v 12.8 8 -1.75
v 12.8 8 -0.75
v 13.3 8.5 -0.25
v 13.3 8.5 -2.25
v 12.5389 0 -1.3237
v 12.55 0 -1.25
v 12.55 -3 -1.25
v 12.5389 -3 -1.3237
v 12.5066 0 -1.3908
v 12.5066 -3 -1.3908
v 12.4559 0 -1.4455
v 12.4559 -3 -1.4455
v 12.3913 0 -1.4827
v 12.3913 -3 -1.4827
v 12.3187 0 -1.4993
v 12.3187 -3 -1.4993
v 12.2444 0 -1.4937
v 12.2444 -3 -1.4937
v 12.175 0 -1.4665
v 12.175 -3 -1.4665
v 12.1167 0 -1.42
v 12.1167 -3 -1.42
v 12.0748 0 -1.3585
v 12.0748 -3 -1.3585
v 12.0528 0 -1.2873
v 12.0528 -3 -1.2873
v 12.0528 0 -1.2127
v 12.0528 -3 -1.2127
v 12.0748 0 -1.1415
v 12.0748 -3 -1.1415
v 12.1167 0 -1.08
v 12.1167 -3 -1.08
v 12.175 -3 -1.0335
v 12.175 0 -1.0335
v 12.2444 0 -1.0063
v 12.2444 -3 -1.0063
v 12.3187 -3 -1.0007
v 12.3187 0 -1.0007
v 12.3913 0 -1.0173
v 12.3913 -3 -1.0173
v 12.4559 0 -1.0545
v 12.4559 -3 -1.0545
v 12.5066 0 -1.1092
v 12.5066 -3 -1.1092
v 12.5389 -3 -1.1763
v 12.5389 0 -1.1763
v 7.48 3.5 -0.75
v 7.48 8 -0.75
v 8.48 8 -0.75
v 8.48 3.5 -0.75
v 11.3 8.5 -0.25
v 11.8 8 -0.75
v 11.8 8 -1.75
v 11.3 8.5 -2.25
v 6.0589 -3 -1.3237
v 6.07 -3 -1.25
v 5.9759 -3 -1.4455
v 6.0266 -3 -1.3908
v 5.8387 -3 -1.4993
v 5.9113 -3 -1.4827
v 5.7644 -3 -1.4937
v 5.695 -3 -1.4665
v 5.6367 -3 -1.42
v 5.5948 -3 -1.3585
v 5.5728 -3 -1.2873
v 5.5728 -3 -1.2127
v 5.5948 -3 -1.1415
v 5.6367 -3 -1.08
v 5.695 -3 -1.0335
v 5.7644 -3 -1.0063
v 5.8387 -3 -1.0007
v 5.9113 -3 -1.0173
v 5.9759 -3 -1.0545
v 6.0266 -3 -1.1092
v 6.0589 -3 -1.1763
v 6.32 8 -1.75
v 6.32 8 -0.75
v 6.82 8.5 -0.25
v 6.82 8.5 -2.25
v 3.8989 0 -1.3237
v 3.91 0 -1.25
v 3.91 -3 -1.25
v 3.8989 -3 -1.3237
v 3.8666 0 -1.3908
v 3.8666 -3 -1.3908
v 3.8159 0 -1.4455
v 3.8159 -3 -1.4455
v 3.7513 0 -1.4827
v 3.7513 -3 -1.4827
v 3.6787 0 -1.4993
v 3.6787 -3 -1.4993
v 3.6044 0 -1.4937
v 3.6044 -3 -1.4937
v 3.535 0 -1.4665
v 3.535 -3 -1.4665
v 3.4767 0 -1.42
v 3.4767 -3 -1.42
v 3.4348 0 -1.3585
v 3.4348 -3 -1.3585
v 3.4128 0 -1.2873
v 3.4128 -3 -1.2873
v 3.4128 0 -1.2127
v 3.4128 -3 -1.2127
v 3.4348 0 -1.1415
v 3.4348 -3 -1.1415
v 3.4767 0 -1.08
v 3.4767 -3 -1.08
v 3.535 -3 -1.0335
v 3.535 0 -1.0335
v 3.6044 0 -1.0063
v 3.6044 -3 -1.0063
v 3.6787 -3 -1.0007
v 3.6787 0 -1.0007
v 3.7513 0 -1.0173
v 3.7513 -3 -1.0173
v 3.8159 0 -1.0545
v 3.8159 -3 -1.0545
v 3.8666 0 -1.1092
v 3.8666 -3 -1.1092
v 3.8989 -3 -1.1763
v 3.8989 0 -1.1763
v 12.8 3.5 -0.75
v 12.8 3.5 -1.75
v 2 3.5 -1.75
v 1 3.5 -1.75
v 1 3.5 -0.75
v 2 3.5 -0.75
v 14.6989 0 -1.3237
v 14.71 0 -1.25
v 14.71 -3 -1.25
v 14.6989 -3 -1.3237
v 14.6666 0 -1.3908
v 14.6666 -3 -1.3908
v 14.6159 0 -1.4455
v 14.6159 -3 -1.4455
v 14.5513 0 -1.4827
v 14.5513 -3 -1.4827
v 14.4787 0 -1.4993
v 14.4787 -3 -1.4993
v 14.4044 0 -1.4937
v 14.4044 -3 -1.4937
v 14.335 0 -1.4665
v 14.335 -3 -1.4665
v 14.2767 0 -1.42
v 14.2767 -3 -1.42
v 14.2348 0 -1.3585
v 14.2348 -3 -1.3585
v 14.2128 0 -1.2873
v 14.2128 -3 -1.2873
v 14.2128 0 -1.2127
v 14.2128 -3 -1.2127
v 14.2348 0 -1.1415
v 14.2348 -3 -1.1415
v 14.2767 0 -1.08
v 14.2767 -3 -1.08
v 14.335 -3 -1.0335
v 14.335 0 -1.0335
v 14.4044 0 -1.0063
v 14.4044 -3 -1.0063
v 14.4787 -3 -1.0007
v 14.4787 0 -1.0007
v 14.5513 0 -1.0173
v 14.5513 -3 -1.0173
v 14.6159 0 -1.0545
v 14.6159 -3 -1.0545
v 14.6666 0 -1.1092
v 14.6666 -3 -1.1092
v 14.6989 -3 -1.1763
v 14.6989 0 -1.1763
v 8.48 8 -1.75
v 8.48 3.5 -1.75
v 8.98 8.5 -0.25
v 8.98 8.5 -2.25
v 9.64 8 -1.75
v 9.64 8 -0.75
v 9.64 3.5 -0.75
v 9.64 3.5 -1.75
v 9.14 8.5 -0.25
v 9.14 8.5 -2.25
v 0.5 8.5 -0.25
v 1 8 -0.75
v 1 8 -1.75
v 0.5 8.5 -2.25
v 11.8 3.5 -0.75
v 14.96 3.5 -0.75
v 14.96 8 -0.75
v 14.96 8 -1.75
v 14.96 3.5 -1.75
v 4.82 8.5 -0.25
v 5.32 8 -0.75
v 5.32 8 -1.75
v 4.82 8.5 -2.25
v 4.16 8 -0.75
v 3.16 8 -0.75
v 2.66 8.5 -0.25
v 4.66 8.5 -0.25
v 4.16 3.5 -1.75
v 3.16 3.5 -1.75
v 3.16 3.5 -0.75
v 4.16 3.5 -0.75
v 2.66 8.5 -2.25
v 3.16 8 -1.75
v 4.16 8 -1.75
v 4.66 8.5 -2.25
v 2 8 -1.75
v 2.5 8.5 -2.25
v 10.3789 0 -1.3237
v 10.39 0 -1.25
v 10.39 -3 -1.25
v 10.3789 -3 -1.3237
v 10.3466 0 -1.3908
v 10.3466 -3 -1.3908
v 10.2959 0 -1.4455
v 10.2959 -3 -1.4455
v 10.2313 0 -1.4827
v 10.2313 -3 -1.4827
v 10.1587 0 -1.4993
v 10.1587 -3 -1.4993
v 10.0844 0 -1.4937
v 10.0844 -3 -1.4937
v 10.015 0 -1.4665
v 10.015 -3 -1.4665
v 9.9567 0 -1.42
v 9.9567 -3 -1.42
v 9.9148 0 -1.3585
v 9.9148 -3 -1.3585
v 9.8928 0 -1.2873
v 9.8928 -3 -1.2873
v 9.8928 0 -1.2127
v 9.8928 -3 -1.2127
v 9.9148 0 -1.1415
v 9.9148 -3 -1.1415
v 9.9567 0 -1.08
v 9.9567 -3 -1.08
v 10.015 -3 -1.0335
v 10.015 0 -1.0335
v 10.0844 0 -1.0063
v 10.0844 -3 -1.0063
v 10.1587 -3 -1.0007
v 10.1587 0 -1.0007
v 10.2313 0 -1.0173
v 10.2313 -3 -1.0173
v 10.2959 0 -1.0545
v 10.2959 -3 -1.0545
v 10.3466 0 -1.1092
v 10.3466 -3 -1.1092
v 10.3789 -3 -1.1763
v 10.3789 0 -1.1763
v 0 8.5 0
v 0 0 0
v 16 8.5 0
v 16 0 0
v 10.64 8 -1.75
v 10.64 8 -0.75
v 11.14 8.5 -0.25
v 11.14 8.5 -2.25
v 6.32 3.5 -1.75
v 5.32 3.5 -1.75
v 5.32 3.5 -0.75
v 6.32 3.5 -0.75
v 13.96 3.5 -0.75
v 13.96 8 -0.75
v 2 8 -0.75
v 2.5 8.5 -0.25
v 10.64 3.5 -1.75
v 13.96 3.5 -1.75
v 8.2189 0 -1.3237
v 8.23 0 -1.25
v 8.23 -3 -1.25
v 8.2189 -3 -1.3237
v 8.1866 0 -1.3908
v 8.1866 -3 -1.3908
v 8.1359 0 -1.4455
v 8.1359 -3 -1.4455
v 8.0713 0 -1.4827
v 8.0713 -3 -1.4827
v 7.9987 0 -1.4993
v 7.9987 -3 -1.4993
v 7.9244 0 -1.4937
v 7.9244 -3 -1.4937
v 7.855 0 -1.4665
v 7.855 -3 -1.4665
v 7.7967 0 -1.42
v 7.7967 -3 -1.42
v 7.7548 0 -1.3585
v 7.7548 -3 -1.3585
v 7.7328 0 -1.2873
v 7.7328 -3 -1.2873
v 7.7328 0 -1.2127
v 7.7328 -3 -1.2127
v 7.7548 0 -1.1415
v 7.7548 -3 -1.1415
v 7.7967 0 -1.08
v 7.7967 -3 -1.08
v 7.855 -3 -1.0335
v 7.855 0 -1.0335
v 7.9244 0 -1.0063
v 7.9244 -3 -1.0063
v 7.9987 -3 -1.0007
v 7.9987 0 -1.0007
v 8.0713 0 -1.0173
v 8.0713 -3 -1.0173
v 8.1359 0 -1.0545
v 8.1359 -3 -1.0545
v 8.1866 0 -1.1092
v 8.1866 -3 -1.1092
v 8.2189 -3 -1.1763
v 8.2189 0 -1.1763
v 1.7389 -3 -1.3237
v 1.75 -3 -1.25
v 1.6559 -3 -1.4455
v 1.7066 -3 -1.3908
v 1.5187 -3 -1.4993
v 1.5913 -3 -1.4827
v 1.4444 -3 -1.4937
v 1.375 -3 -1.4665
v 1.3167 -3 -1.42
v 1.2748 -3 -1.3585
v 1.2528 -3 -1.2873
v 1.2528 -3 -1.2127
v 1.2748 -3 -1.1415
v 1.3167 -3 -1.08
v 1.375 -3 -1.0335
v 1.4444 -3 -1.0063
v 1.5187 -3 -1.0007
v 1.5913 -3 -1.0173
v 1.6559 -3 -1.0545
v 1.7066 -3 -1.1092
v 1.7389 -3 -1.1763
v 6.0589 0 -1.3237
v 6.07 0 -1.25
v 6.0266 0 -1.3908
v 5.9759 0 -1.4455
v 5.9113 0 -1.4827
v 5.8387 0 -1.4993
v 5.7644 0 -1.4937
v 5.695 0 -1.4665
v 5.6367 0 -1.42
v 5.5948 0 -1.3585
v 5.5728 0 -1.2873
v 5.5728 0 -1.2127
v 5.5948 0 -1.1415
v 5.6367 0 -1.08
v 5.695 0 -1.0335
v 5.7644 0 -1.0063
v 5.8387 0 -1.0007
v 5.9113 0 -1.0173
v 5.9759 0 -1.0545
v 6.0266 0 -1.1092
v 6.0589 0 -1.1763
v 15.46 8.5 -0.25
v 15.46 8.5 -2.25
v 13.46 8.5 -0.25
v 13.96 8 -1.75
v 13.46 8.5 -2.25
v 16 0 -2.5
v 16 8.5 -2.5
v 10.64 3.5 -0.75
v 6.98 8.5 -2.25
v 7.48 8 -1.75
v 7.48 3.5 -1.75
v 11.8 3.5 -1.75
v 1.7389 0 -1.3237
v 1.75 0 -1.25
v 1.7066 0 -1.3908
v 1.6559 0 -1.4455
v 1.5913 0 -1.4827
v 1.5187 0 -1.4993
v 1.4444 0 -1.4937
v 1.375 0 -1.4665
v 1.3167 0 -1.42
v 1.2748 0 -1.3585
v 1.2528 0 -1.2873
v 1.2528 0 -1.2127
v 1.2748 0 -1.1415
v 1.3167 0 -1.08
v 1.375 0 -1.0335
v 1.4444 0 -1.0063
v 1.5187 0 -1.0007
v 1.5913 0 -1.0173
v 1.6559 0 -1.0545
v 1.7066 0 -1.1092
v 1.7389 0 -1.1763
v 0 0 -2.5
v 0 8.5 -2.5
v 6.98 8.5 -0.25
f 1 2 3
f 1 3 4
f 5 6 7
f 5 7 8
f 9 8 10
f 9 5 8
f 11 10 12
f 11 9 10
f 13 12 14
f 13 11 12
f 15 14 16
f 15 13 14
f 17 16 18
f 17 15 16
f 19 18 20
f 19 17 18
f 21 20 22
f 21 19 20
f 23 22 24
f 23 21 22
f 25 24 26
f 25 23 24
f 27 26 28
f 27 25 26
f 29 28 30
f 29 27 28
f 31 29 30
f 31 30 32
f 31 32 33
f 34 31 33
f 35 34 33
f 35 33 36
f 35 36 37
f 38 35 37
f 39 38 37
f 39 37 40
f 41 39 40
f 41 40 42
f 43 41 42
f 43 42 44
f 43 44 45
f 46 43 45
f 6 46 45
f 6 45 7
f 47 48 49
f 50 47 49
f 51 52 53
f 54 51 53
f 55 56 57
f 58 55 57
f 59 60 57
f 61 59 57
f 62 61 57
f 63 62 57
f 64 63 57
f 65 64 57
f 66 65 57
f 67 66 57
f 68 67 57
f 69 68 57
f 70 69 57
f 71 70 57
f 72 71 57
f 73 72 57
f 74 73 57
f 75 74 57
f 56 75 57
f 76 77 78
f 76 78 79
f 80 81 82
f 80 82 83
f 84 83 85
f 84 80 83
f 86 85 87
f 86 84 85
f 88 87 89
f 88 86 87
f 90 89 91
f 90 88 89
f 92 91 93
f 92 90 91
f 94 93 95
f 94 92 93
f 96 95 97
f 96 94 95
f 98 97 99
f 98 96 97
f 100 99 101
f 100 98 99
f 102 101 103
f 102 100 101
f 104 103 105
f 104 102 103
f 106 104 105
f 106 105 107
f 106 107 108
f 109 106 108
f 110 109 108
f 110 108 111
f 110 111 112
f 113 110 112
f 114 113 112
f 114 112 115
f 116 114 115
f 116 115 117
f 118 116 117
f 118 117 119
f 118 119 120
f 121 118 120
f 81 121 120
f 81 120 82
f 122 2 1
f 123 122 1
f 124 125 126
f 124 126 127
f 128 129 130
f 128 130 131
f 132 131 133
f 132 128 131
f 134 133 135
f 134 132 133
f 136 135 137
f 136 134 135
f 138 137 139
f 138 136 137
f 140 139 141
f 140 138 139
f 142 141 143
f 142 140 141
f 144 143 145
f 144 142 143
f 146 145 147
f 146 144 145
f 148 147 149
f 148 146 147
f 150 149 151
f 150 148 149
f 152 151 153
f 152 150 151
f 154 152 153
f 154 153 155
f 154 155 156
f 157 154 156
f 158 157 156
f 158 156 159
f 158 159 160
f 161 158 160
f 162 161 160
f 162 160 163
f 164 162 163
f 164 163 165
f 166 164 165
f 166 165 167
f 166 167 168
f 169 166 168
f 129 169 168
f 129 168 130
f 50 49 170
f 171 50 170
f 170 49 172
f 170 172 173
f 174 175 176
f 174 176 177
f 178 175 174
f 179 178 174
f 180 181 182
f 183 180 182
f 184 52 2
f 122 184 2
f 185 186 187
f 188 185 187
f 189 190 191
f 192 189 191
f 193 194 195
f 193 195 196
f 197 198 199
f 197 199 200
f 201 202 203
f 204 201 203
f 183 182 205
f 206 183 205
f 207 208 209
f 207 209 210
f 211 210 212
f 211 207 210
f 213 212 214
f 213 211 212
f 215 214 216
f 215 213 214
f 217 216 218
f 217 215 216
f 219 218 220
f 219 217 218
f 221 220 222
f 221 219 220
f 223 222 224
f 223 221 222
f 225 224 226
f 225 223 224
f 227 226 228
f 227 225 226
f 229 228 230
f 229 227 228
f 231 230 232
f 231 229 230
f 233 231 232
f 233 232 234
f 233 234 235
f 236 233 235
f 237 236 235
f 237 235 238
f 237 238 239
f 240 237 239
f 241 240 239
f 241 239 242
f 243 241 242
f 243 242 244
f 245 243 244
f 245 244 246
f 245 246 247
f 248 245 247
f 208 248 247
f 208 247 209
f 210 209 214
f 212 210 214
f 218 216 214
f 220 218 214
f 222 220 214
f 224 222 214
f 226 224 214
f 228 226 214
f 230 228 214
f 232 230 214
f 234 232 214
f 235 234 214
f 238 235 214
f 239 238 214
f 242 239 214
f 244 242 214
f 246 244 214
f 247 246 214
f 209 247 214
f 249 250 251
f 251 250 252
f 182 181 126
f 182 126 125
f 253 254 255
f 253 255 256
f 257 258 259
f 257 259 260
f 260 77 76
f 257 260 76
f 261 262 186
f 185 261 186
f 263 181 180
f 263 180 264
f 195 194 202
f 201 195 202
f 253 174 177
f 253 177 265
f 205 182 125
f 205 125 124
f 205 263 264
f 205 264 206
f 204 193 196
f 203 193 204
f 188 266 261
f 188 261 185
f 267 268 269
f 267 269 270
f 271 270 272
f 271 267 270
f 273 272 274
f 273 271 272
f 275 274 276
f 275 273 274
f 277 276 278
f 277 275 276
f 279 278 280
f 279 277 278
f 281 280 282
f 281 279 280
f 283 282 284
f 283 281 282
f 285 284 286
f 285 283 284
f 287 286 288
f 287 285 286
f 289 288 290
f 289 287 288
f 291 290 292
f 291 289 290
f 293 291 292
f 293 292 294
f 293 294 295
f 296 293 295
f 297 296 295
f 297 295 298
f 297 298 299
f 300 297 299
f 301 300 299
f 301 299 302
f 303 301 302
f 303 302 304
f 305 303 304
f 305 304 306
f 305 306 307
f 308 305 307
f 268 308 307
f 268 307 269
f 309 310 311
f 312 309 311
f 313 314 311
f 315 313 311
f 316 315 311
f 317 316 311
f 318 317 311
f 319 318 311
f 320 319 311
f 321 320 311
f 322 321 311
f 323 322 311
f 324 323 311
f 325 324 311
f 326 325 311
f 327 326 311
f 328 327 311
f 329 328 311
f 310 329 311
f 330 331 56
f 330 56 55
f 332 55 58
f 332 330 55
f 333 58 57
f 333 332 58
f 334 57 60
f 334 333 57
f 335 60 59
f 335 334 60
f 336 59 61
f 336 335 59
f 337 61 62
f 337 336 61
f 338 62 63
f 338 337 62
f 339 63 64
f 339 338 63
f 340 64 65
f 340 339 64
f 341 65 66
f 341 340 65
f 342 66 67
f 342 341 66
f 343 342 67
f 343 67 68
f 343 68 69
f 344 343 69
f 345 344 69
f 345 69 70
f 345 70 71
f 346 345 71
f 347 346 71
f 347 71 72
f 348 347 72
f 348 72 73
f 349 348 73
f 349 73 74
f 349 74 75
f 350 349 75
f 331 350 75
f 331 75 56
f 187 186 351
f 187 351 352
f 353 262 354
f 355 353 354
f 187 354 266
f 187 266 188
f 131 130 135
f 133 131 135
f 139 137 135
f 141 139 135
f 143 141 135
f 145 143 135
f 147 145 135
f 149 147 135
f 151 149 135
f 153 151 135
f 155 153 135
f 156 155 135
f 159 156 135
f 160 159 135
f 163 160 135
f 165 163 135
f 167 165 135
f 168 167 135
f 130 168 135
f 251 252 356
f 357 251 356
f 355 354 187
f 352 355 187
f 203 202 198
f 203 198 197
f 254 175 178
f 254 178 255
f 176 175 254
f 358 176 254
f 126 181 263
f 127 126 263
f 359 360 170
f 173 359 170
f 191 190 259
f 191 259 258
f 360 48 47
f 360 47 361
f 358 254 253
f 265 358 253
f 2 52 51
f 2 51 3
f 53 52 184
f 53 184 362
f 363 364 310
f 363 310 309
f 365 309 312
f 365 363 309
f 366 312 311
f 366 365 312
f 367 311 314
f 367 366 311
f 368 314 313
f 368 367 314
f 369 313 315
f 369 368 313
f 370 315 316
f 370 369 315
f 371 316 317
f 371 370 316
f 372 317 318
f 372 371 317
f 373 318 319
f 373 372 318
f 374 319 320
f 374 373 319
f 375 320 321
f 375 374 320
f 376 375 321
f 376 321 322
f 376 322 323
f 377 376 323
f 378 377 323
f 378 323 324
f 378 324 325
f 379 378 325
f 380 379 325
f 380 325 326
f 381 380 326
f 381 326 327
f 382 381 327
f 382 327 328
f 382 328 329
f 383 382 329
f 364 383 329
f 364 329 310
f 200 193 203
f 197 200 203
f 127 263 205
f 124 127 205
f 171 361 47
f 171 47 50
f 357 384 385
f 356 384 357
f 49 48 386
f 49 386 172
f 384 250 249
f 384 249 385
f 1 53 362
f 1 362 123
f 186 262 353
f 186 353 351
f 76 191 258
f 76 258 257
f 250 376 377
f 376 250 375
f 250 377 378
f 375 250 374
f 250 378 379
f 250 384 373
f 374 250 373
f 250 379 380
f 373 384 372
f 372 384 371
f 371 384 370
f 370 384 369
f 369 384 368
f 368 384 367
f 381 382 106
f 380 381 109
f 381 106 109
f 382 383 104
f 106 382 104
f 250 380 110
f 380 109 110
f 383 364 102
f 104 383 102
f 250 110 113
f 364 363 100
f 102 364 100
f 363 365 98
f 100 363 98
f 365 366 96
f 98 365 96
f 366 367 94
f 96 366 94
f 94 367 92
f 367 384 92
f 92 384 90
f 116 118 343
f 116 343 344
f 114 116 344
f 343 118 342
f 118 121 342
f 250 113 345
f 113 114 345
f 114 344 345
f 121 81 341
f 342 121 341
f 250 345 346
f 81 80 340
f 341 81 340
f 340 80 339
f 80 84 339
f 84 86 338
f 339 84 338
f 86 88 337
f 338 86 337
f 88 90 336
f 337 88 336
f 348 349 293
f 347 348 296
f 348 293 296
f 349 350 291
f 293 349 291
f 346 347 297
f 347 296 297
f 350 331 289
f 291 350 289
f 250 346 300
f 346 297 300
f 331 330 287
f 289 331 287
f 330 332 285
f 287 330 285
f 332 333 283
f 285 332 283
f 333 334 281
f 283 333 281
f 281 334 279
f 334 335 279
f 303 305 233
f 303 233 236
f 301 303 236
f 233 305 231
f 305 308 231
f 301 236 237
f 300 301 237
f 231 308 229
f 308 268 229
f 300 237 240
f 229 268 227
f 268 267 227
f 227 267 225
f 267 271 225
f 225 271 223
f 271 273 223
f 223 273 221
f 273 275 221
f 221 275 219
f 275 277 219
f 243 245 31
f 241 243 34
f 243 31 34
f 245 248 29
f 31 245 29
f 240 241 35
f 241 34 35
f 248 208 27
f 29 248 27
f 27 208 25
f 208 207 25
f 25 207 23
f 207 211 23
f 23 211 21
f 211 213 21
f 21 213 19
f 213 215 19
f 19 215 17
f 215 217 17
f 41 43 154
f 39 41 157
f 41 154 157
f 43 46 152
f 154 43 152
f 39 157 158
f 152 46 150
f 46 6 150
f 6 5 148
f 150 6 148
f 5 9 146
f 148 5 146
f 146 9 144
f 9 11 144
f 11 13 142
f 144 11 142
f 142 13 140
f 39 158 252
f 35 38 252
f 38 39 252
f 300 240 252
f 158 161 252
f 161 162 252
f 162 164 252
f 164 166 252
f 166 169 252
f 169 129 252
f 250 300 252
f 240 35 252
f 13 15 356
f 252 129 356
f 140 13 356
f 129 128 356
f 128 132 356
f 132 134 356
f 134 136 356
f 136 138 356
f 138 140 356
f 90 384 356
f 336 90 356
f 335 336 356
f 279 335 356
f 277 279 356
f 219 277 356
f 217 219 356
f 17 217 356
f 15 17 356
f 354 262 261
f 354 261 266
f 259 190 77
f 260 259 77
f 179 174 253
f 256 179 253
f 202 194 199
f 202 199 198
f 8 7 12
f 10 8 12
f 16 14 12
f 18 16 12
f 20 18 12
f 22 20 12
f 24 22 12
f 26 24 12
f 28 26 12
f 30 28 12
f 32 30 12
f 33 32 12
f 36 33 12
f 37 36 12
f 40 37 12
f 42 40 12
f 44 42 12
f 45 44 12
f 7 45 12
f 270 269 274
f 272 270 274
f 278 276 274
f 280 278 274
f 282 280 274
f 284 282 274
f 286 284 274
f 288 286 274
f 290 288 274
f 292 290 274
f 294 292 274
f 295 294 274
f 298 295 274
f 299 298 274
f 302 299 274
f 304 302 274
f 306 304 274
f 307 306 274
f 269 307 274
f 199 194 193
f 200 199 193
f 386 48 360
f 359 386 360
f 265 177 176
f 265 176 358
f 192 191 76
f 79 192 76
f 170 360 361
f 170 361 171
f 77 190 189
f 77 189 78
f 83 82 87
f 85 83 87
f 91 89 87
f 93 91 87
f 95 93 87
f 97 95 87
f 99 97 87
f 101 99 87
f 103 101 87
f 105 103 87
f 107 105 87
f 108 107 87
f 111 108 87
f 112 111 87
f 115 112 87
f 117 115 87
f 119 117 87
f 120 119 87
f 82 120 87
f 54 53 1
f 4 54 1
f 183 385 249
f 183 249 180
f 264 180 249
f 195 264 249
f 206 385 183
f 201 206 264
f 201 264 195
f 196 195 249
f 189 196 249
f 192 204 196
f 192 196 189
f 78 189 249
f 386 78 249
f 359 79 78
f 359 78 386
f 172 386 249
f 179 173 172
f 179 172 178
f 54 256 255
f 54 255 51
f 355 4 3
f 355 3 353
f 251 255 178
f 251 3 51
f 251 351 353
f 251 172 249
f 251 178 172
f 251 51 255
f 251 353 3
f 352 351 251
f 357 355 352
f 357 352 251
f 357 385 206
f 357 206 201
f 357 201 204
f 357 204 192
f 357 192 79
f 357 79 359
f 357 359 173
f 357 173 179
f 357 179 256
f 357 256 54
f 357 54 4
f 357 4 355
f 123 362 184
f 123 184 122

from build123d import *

# Parameters (mm, degrees)
SKETCH1_W           = 16
SKETCH1_H           = 2.5
BOSS_EXTRUDE1_DEPTH = 8.5
SKETCH2_W           = 1
SKETCH2_H           = 1
CUT_EXTRUDE1_DEPTH  = 5
CHAMFER1_SIZE       = 0.5
SKETCH3_R           = 0.25
BOSS_EXTRUDE2_DEPTH = 6.5


with BuildPart() as part:
    # Sketch1 → Boss-Extrude1 (new body)
    with BuildSketch(Plane(origin=(0, 0, 0), x_dir=(1, 0, 0), z_dir=(0, 1, 0))):
        with Locations((8, 1.25)):
            Rectangle(SKETCH1_W, SKETCH1_H)
    extrude(amount=BOSS_EXTRUDE1_DEPTH)

    # Sketch2 → Cut-Extrude1 (cut)
    with BuildSketch(Plane(origin=(0, 8.5, 0), x_dir=(1, 0, 0), z_dir=(0, 1, 0))):
        with Locations((1.5, 1.25)):
            Rectangle(SKETCH2_W, SKETCH2_H)
        with Locations((3.66, 1.25)):
            Rectangle(SKETCH2_W, SKETCH2_H)
        with Locations((5.82, 1.25)):
            Rectangle(SKETCH2_W, SKETCH2_H)
        with Locations((7.98, 1.25)):
            Rectangle(SKETCH2_W, SKETCH2_H)
        with Locations((10.14, 1.25)):
            Rectangle(SKETCH2_W, SKETCH2_H)
        with Locations((12.3, 1.25)):
            Rectangle(SKETCH2_W, SKETCH2_H)
        with Locations((14.46, 1.25)):
            Rectangle(SKETCH2_W, SKETCH2_H)
    extrude(amount=-CUT_EXTRUDE1_DEPTH, mode=Mode.SUBTRACT)

    # Chamfer1
    chamfer1_edges = [part.edges().sort_by_distance(p)[0] for p in [
        (1, 8.5, -1.25),
        (1.5, 8.5, -0.75),
        (2, 8.5, -1.25),
        (1.5, 8.5, -1.75),
        (3.16, 8.5, -1.25),
        (3.66, 8.5, -0.75),
        (4.16, 8.5, -1.25),
        (3.66, 8.5, -1.75),
        (5.32, 8.5, -1.25),
        (5.82, 8.5, -0.75),
        (6.32, 8.5, -1.25),
        (5.82, 8.5, -1.75),
        (7.48, 8.5, -1.25),
        (7.98, 8.5, -0.75),
        (8.48, 8.5, -1.25),
        (7.98, 8.5, -1.75),
        (9.64, 8.5, -1.25),
        (10.14, 8.5, -0.75),
        (10.64, 8.5, -1.25),
        (10.14, 8.5, -1.75),
        (11.8, 8.5, -1.25),
        (12.3, 8.5, -0.75),
        (12.8, 8.5, -1.25),
        (12.3, 8.5, -1.75),
        (13.96, 8.5, -1.25),
        (14.46, 8.5, -0.75),
        (14.96, 8.5, -1.25),
        (14.46, 8.5, -1.75),
    ]]
    chamfer(chamfer1_edges, length=CHAMFER1_SIZE)

    # Sketch3 → Boss-Extrude2 (add)
    with BuildSketch(Plane(origin=(0, 3.5, 0), x_dir=(1, 0, 0), z_dir=(0, 1, 0))):
        with Locations((1.5, 1.25)):
            Circle(SKETCH3_R)
        with Locations((3.66, 1.25)):
            Circle(SKETCH3_R)
        with Locations((5.82, 1.25)):
            Circle(SKETCH3_R)
        with Locations((7.98, 1.25)):
            Circle(SKETCH3_R)
        with Locations((10.14, 1.25)):
            Circle(SKETCH3_R)
        with Locations((12.3, 1.25)):
            Circle(SKETCH3_R)
        with Locations((14.46, 1.25)):
            Circle(SKETCH3_R)
    extrude(amount=-BOSS_EXTRUDE2_DEPTH)


solid = part.part
